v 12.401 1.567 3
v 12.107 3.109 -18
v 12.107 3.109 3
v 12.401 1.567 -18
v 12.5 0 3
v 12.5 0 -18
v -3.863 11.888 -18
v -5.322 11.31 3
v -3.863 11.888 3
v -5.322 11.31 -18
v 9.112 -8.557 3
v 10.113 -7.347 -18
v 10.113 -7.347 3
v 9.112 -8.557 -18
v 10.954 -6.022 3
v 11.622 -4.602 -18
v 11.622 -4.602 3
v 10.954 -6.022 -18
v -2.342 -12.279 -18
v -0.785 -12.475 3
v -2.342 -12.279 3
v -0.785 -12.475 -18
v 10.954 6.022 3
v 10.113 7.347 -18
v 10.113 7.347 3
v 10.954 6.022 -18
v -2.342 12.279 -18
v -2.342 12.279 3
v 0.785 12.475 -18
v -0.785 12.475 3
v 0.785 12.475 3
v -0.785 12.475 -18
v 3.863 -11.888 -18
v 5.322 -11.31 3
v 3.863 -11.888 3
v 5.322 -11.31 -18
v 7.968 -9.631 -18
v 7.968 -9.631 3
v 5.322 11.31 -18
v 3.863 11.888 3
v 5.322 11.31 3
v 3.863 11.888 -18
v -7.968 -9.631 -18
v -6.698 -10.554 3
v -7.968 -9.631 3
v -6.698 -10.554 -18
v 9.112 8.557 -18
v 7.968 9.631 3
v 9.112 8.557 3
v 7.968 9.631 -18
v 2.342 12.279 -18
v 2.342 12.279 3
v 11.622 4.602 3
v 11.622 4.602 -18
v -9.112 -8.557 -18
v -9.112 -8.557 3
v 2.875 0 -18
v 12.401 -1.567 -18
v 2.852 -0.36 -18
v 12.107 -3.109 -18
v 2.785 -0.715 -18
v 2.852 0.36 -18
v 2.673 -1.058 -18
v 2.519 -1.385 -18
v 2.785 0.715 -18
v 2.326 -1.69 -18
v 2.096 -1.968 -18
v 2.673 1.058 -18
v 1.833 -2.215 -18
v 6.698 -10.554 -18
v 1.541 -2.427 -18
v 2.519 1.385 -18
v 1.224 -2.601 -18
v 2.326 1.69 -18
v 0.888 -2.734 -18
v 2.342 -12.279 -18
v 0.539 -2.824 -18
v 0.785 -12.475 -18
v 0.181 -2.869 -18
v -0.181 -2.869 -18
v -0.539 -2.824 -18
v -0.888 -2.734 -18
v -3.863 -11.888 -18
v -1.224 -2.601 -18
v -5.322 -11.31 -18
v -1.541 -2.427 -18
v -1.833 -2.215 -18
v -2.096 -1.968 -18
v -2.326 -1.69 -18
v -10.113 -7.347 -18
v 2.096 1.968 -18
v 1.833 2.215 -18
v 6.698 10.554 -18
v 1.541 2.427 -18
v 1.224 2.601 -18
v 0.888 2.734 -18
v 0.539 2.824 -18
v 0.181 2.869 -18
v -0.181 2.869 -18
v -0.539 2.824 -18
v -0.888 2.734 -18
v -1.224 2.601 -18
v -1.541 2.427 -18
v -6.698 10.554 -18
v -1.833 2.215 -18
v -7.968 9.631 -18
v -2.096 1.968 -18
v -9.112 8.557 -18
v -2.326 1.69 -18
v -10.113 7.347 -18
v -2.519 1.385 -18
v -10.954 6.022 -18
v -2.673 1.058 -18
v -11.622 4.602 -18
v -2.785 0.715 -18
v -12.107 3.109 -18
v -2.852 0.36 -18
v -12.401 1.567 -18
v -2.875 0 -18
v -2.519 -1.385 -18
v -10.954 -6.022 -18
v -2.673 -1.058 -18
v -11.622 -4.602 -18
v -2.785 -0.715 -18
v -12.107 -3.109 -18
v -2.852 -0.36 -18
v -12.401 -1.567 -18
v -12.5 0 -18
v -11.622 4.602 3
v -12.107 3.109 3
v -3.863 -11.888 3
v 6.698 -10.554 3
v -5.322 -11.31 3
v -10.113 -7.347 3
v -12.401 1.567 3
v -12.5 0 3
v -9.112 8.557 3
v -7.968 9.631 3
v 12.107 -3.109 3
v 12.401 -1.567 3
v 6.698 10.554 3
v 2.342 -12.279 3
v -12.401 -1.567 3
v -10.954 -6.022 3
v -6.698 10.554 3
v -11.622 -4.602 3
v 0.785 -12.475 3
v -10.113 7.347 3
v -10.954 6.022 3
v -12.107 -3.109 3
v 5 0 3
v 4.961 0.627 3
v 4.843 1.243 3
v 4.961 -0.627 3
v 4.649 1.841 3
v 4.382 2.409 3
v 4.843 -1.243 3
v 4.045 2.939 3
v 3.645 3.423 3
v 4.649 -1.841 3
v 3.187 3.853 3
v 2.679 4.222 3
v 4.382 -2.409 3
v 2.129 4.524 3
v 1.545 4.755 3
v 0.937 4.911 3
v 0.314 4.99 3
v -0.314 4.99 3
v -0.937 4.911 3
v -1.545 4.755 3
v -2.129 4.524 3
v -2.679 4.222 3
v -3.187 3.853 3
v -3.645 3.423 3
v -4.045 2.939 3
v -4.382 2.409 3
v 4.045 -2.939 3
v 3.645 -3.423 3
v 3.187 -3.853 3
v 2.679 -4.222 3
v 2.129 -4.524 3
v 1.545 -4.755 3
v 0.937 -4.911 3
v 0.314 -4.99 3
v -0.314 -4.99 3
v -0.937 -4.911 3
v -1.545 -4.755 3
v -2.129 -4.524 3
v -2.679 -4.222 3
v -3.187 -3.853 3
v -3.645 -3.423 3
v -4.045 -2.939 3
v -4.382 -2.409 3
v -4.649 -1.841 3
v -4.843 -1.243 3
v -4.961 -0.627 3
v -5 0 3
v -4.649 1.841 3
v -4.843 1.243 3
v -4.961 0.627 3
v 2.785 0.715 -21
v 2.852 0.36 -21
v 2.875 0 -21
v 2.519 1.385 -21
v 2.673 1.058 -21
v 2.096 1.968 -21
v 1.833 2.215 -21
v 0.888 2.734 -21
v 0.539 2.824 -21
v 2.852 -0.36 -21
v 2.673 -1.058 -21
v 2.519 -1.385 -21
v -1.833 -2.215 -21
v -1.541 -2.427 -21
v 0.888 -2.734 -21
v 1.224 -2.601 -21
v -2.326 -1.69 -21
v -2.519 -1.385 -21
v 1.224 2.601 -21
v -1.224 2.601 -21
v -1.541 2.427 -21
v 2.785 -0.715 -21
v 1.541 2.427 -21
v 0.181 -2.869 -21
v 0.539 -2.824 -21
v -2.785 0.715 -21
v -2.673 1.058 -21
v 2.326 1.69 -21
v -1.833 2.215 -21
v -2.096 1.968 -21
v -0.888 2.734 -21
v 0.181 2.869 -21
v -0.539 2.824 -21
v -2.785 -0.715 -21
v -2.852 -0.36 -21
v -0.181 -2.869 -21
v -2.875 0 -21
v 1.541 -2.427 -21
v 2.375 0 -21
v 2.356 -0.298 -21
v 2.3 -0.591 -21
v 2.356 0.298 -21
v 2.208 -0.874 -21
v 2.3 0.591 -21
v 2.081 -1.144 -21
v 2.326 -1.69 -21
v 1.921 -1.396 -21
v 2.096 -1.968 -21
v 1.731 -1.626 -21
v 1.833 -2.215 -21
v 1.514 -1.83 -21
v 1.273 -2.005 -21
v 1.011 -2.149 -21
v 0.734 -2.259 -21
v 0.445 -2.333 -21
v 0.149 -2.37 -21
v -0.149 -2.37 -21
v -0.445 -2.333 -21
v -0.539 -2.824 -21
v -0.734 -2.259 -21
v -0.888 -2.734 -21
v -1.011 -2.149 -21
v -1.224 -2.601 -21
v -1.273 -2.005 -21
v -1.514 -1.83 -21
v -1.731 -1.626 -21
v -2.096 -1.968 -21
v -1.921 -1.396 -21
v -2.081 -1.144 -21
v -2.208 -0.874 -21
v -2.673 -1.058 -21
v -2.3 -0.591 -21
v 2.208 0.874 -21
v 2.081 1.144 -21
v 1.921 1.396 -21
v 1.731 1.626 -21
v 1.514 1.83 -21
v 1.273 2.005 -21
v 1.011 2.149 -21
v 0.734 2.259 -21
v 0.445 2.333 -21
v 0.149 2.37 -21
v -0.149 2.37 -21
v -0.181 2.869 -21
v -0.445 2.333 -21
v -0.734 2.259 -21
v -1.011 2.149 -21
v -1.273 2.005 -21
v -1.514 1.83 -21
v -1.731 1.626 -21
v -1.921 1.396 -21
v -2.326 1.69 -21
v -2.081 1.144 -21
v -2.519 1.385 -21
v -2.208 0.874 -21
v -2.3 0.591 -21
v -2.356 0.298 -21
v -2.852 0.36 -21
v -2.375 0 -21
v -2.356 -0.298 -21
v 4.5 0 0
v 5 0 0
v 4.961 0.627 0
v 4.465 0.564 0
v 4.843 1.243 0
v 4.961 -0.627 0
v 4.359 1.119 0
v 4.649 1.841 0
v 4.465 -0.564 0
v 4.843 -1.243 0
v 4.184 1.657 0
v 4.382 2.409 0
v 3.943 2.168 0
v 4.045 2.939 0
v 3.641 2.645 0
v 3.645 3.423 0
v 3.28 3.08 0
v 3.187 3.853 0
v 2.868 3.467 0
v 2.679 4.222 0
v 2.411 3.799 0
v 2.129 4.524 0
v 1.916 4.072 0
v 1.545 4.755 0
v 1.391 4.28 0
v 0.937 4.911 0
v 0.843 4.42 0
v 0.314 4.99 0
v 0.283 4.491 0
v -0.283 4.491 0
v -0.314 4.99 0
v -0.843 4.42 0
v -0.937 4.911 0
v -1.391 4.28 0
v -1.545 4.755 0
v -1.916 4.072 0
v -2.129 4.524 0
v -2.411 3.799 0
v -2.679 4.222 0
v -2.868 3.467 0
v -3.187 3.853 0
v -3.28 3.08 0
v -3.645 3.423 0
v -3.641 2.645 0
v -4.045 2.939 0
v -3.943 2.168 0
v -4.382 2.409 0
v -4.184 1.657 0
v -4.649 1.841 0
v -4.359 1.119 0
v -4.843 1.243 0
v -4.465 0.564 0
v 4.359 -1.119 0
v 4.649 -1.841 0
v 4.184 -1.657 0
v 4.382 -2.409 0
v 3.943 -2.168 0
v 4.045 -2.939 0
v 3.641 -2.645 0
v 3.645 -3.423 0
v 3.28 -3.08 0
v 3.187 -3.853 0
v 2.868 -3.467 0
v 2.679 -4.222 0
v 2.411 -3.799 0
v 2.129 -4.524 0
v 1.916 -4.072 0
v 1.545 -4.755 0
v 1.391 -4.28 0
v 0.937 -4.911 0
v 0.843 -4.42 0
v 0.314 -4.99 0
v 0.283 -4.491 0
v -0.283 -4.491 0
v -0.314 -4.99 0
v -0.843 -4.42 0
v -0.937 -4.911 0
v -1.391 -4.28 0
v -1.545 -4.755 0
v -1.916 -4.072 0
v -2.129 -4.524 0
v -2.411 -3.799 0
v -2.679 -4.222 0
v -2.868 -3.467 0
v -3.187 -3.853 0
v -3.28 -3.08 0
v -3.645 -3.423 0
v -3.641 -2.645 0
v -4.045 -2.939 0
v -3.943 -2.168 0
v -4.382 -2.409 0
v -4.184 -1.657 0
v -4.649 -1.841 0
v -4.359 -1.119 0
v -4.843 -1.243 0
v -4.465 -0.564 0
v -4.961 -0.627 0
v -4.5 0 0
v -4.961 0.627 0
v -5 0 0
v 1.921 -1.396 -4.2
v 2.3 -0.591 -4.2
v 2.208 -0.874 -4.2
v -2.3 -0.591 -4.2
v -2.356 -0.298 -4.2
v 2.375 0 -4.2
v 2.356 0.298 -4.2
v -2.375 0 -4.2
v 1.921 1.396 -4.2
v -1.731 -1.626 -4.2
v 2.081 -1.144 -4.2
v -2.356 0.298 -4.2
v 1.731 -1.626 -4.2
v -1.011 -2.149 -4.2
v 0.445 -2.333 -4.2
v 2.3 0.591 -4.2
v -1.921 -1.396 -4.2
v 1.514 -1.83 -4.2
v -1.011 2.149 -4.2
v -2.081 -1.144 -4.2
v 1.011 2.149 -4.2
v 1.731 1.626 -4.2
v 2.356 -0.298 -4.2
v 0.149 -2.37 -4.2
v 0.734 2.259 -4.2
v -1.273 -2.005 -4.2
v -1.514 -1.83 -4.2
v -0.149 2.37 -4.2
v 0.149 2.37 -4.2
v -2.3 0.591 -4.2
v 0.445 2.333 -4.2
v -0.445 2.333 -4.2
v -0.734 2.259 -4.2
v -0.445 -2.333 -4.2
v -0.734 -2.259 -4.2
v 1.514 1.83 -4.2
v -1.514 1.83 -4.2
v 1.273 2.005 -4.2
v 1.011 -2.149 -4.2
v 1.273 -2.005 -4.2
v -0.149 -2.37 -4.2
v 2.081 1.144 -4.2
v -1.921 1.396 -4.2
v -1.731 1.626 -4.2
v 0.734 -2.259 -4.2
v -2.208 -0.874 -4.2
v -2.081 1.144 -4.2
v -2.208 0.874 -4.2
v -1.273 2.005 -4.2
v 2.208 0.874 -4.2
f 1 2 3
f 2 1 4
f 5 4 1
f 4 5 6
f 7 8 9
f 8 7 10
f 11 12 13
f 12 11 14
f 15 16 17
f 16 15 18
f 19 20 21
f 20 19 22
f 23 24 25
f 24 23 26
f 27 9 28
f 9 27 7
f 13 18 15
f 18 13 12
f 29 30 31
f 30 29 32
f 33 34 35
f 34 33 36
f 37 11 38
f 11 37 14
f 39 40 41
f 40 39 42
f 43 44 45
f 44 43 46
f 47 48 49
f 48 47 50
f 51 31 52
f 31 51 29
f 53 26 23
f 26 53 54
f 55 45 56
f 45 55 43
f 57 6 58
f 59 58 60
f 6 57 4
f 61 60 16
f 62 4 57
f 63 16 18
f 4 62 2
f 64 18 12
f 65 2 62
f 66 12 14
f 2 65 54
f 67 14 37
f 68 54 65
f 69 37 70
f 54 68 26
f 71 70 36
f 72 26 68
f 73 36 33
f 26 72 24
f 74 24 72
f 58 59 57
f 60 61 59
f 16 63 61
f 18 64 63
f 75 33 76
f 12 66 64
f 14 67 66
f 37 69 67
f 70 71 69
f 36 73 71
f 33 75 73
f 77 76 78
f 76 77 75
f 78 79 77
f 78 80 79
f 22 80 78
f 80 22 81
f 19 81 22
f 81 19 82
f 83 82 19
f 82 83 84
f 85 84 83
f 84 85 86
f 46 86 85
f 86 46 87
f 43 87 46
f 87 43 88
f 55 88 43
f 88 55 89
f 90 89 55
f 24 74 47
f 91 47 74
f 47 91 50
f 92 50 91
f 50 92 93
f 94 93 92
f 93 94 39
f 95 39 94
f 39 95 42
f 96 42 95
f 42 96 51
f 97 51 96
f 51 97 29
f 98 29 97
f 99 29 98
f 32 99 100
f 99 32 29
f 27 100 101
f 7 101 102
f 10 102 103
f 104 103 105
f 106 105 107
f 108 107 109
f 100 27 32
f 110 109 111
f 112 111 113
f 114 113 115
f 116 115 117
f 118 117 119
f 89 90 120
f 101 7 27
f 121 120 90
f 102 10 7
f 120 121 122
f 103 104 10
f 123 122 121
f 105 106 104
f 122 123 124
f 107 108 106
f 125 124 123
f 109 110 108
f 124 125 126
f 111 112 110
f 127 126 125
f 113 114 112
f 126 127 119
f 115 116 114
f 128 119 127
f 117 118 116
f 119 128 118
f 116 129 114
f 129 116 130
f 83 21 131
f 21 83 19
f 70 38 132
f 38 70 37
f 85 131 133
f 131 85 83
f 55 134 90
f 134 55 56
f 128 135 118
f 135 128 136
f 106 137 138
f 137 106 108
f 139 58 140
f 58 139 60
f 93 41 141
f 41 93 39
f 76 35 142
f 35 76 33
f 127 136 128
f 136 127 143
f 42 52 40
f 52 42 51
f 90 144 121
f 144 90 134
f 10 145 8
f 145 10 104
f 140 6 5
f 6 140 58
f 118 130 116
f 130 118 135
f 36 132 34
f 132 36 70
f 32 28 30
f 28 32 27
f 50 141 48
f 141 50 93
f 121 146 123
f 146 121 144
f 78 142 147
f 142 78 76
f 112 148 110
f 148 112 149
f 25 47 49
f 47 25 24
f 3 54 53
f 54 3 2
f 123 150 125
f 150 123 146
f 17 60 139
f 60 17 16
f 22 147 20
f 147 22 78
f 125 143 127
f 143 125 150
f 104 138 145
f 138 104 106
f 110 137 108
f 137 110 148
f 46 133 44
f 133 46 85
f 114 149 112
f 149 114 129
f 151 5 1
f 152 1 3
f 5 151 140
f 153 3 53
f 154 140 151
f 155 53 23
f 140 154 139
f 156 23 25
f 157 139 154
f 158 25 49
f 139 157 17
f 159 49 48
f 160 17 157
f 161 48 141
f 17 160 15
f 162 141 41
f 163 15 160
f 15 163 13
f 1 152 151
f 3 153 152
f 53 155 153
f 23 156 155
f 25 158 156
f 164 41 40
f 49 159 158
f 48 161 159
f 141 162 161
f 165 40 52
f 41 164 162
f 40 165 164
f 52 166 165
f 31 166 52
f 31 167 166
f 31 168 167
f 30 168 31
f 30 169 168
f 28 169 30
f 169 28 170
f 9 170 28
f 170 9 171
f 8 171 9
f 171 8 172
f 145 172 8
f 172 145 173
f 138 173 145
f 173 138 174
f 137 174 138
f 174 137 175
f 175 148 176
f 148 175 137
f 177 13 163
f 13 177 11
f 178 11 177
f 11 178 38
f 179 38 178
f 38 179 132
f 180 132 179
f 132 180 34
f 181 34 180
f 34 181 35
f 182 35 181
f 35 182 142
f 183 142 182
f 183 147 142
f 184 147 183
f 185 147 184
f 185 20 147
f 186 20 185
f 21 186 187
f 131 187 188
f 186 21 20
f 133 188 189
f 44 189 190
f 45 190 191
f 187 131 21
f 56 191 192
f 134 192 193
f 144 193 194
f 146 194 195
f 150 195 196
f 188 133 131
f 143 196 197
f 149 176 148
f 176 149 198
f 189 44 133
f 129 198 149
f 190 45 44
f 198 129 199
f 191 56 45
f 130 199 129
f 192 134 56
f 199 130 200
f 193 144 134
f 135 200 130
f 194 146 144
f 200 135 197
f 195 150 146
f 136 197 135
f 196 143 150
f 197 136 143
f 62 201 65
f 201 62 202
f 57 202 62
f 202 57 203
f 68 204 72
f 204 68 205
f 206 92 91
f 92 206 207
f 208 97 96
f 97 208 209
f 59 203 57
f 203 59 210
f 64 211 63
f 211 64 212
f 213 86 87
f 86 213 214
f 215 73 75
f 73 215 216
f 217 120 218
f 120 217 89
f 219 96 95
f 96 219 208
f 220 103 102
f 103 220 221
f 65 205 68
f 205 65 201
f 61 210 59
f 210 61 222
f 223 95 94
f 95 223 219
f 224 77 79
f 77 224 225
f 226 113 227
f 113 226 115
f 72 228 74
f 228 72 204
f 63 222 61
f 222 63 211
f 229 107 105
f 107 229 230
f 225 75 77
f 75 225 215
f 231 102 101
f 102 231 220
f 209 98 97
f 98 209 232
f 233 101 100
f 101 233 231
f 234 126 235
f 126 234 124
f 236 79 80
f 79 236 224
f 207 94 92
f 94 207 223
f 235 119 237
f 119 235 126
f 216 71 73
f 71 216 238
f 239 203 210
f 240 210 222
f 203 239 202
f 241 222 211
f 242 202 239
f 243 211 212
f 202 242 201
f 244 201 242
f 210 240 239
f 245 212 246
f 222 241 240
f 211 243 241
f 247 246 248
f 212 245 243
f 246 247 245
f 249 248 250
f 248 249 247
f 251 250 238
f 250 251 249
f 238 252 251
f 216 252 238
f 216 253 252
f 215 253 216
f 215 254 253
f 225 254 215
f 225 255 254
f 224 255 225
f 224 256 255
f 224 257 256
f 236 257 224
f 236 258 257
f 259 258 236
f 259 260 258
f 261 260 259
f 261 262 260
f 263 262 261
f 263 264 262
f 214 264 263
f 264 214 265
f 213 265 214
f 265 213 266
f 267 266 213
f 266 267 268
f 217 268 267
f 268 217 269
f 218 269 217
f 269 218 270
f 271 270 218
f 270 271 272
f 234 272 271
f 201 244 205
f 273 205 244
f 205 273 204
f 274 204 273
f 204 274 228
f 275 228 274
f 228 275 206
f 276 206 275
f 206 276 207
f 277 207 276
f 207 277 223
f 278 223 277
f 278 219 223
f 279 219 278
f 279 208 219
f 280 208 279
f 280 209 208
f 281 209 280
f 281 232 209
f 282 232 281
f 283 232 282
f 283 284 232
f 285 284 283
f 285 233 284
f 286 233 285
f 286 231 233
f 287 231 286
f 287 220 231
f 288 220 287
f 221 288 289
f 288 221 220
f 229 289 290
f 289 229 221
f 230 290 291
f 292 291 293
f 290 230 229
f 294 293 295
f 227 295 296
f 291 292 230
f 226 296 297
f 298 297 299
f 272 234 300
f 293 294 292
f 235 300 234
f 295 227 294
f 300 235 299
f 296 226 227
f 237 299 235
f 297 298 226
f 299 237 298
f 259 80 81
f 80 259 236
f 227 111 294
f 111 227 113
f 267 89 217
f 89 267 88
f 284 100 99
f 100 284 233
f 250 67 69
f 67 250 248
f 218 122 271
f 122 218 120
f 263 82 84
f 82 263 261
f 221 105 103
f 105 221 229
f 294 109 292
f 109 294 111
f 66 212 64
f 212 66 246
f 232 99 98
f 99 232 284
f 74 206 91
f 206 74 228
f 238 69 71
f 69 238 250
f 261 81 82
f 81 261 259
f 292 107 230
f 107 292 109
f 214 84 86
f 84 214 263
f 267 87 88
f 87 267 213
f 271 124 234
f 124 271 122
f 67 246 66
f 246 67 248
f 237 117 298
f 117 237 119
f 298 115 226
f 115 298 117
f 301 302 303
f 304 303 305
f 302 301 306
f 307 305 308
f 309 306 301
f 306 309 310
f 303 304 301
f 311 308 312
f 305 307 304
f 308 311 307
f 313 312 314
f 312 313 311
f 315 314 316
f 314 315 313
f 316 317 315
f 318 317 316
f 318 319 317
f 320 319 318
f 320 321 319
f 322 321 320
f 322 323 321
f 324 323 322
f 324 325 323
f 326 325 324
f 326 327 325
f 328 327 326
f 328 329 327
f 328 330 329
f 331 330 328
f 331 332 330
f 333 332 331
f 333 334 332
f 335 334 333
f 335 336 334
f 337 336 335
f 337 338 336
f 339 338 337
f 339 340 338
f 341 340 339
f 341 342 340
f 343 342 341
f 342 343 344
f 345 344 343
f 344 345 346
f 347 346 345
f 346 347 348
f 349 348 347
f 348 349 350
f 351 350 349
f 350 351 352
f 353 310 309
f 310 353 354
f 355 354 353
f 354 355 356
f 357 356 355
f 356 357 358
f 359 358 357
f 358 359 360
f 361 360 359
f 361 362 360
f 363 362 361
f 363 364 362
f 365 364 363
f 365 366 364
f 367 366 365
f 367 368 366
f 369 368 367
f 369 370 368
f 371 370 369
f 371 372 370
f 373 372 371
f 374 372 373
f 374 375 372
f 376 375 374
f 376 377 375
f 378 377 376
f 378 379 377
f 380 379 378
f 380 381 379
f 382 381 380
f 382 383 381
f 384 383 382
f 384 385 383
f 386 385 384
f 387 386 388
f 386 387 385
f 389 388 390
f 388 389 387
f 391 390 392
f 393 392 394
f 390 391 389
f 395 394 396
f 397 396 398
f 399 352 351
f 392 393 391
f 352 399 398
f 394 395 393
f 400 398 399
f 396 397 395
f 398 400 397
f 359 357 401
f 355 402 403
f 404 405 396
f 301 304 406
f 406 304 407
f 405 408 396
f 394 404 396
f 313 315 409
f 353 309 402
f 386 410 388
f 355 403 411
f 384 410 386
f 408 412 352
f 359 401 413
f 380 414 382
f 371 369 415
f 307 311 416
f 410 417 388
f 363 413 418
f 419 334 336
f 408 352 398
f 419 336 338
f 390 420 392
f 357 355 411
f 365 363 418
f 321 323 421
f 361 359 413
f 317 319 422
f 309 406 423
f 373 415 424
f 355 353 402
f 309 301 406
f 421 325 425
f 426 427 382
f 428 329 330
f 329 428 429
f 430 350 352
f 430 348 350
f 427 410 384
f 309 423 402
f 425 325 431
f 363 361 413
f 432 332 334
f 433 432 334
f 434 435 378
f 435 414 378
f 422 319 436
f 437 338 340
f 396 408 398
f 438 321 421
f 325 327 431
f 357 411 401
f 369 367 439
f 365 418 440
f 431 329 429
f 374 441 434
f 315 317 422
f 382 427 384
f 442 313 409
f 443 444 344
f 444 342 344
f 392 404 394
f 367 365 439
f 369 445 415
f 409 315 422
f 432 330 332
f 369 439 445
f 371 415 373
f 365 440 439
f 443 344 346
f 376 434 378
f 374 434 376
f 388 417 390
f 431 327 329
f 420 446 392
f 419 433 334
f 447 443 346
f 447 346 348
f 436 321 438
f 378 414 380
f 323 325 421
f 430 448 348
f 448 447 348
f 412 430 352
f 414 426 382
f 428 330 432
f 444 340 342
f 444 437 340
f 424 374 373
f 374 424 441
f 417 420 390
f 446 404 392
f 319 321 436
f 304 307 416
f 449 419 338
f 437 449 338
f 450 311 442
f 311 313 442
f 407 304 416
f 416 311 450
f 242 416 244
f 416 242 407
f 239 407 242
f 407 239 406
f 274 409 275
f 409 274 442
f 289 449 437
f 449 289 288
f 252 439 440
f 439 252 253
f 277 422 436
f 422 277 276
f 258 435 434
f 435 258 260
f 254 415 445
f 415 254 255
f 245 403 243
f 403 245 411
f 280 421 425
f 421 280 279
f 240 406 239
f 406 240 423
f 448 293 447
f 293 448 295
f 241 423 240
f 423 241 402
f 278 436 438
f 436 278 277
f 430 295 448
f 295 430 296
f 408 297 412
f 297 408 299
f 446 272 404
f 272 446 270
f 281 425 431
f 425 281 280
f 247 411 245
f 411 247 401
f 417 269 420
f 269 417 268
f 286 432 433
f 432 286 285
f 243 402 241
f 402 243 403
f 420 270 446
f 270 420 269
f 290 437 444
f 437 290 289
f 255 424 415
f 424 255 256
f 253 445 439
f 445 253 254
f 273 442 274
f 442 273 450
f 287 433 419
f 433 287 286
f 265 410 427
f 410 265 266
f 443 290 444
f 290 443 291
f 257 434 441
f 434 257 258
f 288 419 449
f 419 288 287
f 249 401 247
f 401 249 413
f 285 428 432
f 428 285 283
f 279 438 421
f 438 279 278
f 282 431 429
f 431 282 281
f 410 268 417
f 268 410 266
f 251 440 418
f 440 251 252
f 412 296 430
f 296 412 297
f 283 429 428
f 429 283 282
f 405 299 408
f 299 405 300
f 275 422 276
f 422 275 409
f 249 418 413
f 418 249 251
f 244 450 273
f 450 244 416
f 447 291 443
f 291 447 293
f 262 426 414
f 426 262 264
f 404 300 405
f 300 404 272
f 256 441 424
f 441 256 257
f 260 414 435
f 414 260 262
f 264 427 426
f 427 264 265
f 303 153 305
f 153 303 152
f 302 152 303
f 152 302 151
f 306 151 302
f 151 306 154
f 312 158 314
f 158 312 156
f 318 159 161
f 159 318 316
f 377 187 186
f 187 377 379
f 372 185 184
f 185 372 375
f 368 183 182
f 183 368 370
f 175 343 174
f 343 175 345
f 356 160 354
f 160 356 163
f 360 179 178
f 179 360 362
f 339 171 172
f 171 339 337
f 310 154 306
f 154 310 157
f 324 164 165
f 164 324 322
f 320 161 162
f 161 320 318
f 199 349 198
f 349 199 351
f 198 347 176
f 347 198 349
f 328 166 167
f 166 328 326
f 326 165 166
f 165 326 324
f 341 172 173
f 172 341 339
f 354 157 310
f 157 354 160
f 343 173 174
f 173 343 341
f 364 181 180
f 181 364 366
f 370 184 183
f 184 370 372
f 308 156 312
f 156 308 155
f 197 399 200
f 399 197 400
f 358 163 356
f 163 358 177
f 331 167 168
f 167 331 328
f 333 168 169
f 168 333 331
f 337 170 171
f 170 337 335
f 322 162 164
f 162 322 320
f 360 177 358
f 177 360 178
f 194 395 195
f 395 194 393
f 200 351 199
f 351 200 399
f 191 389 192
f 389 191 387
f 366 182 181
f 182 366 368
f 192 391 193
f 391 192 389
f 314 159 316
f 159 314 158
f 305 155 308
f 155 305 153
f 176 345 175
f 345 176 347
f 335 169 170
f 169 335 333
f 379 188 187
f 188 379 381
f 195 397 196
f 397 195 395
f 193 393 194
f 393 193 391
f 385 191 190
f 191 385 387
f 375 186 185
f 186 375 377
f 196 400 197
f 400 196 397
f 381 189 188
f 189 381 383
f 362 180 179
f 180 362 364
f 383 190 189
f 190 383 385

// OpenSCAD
$fn = 50;


difference() {
	union() {
		translate(v = [0, 0, -18.0000000000]) {
			cylinder(h = 21, r = 12.5000000000);
		}
		#translate(v = [0, 0, -21.0000000000]) {
			cylinder(h = 21, r = 2.8750000000);
		}
	}
	union() {
		translate(v = [0, 0, 0]) {
			rotate(a = [0, 0, 0]) {
				difference() {
					union() {
						translate(v = [0, 0, -21.0000000000]) {
							cylinder(h = 21, r = 2.2500000000);
						}
						translate(v = [0, 0, -4.2000000000]) {
							cylinder(h = 4.2000000000, r1 = 2.3750000000, r2 = 4.5000000000);
						}
						translate(v = [0, 0, -21.0000000000]) {
							cylinder(h = 21, r = 2.3750000000);
						}
						translate(v = [0, 0, -21.0000000000]) {
							cylinder(h = 21, r = 2.2500000000);
						}
					}
					union();
				}
			}
		}
		#cylinder(h = 3, r = 5.0000000000);
	}
}
